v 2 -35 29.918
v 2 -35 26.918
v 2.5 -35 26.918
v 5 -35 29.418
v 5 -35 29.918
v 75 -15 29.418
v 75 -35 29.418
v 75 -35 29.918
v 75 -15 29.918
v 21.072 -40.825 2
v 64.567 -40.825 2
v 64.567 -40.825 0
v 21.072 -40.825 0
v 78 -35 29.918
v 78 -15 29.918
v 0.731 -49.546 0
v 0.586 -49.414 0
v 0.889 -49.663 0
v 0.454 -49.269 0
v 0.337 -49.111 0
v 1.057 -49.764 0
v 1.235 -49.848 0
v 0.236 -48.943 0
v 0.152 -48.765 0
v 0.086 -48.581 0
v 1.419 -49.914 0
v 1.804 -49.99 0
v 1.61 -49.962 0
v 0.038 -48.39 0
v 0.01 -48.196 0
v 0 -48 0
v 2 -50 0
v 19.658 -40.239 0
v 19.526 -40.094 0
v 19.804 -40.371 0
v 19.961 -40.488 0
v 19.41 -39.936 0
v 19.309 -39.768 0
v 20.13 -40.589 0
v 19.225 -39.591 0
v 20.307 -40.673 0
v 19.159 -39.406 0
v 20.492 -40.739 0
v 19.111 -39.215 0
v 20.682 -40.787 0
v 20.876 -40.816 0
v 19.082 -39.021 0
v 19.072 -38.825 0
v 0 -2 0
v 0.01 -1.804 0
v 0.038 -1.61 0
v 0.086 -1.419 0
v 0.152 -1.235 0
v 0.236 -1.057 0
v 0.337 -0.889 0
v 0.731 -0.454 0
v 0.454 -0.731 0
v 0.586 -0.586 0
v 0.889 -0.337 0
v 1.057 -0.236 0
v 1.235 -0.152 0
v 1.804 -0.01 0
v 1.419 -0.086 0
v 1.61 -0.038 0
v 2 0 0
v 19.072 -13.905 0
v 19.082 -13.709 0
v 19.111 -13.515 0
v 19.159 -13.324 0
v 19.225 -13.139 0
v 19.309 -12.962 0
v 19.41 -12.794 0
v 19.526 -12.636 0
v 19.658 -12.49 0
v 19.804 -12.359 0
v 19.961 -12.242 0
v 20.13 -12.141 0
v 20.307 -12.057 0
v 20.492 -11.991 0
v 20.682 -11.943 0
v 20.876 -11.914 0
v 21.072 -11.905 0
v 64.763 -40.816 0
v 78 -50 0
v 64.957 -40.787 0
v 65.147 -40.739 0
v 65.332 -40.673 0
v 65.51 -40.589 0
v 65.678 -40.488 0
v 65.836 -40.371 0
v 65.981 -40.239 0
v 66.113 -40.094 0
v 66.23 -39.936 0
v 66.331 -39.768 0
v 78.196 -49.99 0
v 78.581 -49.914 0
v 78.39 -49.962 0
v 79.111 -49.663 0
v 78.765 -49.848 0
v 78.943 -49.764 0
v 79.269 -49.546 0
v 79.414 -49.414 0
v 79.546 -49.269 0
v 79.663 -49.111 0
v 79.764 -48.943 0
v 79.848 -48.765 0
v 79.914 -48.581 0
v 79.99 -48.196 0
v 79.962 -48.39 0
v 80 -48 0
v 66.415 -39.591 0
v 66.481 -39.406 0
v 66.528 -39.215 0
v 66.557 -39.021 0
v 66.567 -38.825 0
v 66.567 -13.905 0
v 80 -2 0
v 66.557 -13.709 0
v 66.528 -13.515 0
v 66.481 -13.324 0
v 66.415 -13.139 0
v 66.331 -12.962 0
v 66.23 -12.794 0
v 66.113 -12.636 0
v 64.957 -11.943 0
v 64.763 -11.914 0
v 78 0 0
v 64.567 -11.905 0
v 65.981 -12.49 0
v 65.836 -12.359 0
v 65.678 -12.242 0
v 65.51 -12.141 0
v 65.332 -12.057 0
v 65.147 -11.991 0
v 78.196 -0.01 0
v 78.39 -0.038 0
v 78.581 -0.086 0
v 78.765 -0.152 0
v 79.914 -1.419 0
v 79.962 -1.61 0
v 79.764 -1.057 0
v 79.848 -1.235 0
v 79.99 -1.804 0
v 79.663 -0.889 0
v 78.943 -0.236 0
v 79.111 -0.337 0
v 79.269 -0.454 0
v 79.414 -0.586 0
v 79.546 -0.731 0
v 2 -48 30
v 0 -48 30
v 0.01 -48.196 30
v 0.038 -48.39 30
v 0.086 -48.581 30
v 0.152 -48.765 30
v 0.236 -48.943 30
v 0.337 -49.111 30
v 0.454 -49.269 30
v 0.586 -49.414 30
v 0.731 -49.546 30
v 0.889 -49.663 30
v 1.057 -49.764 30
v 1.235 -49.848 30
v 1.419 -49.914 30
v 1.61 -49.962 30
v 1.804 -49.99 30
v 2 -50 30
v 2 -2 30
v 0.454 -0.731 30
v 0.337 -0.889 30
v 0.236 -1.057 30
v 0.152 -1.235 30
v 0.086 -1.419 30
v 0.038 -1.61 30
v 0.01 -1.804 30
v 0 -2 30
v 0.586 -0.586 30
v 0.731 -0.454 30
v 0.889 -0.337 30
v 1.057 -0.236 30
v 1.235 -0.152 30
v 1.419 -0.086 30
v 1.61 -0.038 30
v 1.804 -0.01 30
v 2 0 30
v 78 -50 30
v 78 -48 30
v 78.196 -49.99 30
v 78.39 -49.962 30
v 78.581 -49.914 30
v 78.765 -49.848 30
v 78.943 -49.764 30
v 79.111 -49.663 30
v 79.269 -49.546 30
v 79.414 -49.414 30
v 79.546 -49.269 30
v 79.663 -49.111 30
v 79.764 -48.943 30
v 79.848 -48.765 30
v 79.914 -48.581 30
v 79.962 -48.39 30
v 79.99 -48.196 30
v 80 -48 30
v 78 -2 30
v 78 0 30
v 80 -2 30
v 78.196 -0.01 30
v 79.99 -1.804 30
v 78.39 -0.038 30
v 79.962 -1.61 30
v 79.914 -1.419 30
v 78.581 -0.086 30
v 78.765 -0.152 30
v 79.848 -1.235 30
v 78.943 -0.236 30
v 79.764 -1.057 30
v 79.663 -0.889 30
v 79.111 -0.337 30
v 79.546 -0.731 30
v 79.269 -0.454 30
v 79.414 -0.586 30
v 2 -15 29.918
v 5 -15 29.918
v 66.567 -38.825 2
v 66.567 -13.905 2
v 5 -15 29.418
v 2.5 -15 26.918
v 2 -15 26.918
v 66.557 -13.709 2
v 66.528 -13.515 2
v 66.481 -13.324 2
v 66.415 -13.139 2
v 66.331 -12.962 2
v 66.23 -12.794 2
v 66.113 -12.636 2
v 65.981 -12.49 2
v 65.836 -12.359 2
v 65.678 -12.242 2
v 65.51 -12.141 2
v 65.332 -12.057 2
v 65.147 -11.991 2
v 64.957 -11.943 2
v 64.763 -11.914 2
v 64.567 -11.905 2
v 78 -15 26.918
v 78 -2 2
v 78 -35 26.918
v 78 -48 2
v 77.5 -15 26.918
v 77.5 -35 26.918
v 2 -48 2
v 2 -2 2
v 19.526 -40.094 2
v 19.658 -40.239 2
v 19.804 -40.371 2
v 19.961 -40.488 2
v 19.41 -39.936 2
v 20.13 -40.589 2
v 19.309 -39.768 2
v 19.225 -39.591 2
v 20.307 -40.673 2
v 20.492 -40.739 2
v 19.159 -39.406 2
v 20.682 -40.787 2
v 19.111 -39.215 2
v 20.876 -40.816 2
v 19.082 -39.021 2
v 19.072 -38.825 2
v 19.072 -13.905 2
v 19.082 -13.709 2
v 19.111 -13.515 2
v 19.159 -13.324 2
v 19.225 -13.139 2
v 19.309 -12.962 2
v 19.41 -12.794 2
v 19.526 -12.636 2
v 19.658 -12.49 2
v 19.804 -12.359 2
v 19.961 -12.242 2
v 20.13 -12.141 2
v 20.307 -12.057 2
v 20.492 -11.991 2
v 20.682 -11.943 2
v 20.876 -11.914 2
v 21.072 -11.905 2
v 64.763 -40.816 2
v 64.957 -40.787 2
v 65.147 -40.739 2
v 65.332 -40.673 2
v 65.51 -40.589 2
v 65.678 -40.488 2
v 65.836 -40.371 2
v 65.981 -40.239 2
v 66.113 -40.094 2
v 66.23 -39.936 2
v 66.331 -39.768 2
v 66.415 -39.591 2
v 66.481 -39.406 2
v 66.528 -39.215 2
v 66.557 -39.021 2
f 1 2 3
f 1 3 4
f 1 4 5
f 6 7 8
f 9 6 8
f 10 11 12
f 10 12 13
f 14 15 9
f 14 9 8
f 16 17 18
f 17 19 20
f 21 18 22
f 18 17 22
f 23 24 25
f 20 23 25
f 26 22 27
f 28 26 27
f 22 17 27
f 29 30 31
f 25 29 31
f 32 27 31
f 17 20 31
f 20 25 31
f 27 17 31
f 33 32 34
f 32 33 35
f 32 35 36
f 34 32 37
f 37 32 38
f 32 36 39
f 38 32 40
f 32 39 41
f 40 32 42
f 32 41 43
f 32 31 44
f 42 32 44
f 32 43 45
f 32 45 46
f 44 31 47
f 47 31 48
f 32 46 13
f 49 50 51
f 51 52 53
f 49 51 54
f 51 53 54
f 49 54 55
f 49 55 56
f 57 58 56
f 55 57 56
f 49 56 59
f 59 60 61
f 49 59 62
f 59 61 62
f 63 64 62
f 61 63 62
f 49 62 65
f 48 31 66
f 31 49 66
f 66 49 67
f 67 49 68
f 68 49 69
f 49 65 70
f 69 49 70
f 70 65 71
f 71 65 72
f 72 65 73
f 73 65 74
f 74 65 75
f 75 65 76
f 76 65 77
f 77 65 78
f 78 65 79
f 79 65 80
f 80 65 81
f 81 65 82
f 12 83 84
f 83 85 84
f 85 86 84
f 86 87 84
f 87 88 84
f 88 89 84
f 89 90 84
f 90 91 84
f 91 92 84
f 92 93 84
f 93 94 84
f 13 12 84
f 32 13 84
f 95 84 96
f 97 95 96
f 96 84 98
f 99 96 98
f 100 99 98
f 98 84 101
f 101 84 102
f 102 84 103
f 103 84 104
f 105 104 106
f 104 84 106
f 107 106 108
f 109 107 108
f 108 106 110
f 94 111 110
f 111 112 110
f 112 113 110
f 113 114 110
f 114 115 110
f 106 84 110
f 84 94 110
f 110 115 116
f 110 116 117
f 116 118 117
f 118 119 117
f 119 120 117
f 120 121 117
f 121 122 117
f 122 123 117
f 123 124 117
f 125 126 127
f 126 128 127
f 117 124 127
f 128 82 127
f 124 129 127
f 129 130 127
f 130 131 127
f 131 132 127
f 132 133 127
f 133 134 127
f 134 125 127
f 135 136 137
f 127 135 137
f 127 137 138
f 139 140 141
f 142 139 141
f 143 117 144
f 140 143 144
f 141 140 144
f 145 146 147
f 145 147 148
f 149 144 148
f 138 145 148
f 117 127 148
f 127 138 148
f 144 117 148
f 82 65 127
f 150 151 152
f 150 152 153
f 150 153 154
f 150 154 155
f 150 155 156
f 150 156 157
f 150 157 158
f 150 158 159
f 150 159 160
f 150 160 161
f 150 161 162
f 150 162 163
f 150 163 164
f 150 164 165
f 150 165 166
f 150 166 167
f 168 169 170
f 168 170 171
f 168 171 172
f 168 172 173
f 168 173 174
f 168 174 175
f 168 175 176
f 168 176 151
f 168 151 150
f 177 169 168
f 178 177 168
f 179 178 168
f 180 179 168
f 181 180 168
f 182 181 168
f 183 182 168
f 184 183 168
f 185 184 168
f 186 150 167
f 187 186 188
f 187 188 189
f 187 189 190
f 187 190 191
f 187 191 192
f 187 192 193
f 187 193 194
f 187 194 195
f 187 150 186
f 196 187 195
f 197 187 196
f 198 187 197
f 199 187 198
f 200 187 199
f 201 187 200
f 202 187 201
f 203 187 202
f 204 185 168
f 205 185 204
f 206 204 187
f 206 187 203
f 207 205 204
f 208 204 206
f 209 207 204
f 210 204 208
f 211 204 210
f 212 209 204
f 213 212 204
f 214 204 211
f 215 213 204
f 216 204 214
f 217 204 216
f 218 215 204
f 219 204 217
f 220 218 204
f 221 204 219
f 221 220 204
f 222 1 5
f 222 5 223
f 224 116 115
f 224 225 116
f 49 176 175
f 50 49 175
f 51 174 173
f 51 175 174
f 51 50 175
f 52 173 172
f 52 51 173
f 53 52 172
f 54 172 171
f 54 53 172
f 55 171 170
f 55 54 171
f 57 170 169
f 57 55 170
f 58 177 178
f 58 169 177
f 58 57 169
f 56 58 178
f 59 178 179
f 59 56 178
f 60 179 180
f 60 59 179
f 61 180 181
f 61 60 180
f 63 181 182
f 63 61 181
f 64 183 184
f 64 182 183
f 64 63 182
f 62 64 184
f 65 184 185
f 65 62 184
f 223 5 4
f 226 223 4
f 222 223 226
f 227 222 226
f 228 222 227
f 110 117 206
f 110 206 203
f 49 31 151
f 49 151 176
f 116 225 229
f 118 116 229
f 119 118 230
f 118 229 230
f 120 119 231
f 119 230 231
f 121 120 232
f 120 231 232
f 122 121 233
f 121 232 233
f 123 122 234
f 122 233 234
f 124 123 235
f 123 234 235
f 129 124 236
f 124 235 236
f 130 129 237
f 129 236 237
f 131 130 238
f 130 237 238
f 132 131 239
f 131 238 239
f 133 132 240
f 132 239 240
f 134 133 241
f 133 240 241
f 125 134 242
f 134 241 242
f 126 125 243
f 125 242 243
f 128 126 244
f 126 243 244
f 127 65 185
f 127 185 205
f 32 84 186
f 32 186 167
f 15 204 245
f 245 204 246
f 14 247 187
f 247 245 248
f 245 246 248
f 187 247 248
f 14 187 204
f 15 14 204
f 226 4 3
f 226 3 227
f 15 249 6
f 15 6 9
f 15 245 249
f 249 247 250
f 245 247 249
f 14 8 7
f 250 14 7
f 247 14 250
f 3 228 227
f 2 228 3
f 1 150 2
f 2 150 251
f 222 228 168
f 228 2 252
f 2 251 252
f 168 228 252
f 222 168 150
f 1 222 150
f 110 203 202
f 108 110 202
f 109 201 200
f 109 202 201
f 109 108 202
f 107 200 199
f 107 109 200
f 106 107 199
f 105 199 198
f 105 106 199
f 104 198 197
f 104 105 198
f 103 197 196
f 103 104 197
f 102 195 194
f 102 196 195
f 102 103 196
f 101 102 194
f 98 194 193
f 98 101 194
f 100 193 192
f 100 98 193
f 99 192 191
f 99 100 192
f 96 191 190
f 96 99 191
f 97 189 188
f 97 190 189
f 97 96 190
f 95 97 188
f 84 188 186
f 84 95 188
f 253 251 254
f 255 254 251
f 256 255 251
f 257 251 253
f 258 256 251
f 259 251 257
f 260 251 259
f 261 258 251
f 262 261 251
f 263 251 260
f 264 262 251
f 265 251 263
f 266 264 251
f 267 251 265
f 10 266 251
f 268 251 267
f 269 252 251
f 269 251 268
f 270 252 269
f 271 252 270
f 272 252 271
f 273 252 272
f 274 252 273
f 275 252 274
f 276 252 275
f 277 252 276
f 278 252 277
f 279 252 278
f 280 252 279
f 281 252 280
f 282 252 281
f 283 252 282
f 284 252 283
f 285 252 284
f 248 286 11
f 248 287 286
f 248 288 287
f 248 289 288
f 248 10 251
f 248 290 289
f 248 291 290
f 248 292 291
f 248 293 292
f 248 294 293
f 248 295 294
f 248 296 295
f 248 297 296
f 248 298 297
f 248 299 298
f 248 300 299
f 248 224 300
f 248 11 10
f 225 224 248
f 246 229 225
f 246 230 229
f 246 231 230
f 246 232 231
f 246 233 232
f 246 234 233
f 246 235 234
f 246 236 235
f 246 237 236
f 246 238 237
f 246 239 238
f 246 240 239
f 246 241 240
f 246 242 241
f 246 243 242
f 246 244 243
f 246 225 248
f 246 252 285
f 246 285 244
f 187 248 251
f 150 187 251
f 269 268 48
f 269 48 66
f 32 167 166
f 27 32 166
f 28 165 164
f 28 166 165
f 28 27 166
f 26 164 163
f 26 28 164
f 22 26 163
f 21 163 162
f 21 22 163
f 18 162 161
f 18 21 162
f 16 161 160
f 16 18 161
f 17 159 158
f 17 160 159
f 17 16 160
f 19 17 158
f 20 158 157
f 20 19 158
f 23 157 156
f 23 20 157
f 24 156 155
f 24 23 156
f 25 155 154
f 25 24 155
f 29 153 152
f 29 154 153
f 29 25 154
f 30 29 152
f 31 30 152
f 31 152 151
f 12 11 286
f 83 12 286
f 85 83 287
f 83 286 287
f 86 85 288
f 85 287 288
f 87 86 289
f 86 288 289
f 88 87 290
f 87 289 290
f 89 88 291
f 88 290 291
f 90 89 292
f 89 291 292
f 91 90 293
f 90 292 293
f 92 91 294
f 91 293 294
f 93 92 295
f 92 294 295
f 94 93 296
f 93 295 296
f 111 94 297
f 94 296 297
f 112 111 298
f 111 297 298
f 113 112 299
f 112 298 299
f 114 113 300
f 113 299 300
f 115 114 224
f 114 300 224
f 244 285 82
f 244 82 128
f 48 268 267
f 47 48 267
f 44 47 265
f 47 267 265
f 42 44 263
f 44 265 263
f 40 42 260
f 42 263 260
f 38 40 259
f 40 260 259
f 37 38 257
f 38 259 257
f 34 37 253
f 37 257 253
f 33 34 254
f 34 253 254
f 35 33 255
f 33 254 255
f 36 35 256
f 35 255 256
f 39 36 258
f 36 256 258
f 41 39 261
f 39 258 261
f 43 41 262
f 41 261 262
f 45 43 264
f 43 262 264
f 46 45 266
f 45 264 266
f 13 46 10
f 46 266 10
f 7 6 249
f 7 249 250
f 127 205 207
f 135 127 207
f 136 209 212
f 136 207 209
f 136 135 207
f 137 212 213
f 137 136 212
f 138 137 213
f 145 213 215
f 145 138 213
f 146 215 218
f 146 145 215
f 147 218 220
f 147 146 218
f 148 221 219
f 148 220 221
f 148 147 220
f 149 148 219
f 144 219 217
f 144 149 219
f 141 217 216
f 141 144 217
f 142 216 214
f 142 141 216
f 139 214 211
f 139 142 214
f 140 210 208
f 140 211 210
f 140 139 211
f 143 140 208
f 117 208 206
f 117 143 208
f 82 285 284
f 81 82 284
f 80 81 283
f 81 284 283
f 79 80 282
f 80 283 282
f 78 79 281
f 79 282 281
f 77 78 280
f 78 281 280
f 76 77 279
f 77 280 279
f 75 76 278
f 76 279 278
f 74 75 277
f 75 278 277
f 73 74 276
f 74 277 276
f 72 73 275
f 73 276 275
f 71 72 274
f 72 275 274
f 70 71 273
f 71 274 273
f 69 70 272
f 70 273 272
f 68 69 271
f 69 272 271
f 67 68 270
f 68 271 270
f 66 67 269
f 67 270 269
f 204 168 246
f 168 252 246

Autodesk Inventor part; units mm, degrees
ref_plane "YZ Plane" through (0, 0, 0) normal (1, 0, 0) x (0, 1, 0)
ref_plane "XZ Plane" through (0, 0, 0) normal (0, 1, 0) x (-1, 0, 0)
sketch "Náčrt3" plane through (0, 0, 0) normal (0, 0, 1) x (1, 0, 0)
  line L0 (2, 0) -> (78, 0)
  line L1 (80, -2) -> (80, -48)
  line L2 (78, -50) -> (2, -50)
  line L3 (0, -48) -> (0, -2)
  arc A0 (2, 0) -> (0, -2) centre (2, -2) ccw
  arc A1 (0, -48) -> (2, -50) centre (2, -48) ccw
  arc A2 (80, -2) -> (78, 0) centre (78, -2) ccw
  arc A3 (78, -50) -> (80, -48) centre (78, -48) ccw
  point P0 (0, 0)
  point P1 (80, -50)
  point P2 (80, 0)
  point P3 (0, -50)
  dimension "d4" = 80
  dimension "d5" = 50
  dimension "d6" = 2
extrude "Vysunutí2" add sketch "Náčrt3" along normal blind 30
shell "Skořepina1" thickness 2 removed faces 1 at (27.3333, -16.6667, 30)
sketch "Náčrt4" plane through (2, -48, 30) normal (1, 0, 0) x (0, 0, -1)
  line L0 (0.0823, 33) -> (3.0823, 33)
  line L1 (3.0823, 33) -> (3.0823, 13)
  line L2 (3.0823, 13) -> (0.0823, 13)
  line L3 (0.0823, 13) -> (0.0823, 33)
  point P0 (30, 48)
  dimension "d10" = 3
  dimension "d11" = 20
  dimension "d12" = 15
extrude "Vysunutí3" add sketch "Náčrt4" along normal blind 3
chamfer "Zkosení1" distance 2.5 angle 45 1 edges at (5, -25, 26.9177)
ref_plane "Pracovní rovina2" through (40, -48, 0) normal (1, 0, 0) x (0, 0, -1)
mirror "Zrcadlit1" about plane through (40, -48, 0) normal (1, 0, 0) of "Vysunutí3", "Zkosení1"
sketch "Náčrt5" plane through (2, -48, 2) normal (0, 0, 1) x (1, 0, 0)
  line L0 (19.0725, 36.0953) -> (62.5669, 36.0953)
  line L1 (64.5669, 34.0953) -> (64.5669, 9.1748)
  line L2 (62.5669, 7.1748) -> (19.0725, 7.1748)
  line L3 (17.0725, 9.1748) -> (17.0725, 34.0953)
  arc A0 (19.0725, 36.0953) -> (17.0725, 34.0953) centre (19.0725, 34.0953) ccw
  arc A1 (17.0725, 9.1748) -> (19.0725, 7.1748) centre (19.0725, 9.1748) ccw
  arc A2 (64.5669, 34.0953) -> (62.5669, 36.0953) centre (62.5669, 34.0953) ccw
  arc A3 (62.5669, 7.1748) -> (64.5669, 9.1748) centre (62.5669, 9.1748) ccw
  point P0 (-2, 48)
  dimension "d19" = 2
extrude "Vysunutí4" cut sketch "Náčrt5" against normal blind 3
properties part number "spodok"
